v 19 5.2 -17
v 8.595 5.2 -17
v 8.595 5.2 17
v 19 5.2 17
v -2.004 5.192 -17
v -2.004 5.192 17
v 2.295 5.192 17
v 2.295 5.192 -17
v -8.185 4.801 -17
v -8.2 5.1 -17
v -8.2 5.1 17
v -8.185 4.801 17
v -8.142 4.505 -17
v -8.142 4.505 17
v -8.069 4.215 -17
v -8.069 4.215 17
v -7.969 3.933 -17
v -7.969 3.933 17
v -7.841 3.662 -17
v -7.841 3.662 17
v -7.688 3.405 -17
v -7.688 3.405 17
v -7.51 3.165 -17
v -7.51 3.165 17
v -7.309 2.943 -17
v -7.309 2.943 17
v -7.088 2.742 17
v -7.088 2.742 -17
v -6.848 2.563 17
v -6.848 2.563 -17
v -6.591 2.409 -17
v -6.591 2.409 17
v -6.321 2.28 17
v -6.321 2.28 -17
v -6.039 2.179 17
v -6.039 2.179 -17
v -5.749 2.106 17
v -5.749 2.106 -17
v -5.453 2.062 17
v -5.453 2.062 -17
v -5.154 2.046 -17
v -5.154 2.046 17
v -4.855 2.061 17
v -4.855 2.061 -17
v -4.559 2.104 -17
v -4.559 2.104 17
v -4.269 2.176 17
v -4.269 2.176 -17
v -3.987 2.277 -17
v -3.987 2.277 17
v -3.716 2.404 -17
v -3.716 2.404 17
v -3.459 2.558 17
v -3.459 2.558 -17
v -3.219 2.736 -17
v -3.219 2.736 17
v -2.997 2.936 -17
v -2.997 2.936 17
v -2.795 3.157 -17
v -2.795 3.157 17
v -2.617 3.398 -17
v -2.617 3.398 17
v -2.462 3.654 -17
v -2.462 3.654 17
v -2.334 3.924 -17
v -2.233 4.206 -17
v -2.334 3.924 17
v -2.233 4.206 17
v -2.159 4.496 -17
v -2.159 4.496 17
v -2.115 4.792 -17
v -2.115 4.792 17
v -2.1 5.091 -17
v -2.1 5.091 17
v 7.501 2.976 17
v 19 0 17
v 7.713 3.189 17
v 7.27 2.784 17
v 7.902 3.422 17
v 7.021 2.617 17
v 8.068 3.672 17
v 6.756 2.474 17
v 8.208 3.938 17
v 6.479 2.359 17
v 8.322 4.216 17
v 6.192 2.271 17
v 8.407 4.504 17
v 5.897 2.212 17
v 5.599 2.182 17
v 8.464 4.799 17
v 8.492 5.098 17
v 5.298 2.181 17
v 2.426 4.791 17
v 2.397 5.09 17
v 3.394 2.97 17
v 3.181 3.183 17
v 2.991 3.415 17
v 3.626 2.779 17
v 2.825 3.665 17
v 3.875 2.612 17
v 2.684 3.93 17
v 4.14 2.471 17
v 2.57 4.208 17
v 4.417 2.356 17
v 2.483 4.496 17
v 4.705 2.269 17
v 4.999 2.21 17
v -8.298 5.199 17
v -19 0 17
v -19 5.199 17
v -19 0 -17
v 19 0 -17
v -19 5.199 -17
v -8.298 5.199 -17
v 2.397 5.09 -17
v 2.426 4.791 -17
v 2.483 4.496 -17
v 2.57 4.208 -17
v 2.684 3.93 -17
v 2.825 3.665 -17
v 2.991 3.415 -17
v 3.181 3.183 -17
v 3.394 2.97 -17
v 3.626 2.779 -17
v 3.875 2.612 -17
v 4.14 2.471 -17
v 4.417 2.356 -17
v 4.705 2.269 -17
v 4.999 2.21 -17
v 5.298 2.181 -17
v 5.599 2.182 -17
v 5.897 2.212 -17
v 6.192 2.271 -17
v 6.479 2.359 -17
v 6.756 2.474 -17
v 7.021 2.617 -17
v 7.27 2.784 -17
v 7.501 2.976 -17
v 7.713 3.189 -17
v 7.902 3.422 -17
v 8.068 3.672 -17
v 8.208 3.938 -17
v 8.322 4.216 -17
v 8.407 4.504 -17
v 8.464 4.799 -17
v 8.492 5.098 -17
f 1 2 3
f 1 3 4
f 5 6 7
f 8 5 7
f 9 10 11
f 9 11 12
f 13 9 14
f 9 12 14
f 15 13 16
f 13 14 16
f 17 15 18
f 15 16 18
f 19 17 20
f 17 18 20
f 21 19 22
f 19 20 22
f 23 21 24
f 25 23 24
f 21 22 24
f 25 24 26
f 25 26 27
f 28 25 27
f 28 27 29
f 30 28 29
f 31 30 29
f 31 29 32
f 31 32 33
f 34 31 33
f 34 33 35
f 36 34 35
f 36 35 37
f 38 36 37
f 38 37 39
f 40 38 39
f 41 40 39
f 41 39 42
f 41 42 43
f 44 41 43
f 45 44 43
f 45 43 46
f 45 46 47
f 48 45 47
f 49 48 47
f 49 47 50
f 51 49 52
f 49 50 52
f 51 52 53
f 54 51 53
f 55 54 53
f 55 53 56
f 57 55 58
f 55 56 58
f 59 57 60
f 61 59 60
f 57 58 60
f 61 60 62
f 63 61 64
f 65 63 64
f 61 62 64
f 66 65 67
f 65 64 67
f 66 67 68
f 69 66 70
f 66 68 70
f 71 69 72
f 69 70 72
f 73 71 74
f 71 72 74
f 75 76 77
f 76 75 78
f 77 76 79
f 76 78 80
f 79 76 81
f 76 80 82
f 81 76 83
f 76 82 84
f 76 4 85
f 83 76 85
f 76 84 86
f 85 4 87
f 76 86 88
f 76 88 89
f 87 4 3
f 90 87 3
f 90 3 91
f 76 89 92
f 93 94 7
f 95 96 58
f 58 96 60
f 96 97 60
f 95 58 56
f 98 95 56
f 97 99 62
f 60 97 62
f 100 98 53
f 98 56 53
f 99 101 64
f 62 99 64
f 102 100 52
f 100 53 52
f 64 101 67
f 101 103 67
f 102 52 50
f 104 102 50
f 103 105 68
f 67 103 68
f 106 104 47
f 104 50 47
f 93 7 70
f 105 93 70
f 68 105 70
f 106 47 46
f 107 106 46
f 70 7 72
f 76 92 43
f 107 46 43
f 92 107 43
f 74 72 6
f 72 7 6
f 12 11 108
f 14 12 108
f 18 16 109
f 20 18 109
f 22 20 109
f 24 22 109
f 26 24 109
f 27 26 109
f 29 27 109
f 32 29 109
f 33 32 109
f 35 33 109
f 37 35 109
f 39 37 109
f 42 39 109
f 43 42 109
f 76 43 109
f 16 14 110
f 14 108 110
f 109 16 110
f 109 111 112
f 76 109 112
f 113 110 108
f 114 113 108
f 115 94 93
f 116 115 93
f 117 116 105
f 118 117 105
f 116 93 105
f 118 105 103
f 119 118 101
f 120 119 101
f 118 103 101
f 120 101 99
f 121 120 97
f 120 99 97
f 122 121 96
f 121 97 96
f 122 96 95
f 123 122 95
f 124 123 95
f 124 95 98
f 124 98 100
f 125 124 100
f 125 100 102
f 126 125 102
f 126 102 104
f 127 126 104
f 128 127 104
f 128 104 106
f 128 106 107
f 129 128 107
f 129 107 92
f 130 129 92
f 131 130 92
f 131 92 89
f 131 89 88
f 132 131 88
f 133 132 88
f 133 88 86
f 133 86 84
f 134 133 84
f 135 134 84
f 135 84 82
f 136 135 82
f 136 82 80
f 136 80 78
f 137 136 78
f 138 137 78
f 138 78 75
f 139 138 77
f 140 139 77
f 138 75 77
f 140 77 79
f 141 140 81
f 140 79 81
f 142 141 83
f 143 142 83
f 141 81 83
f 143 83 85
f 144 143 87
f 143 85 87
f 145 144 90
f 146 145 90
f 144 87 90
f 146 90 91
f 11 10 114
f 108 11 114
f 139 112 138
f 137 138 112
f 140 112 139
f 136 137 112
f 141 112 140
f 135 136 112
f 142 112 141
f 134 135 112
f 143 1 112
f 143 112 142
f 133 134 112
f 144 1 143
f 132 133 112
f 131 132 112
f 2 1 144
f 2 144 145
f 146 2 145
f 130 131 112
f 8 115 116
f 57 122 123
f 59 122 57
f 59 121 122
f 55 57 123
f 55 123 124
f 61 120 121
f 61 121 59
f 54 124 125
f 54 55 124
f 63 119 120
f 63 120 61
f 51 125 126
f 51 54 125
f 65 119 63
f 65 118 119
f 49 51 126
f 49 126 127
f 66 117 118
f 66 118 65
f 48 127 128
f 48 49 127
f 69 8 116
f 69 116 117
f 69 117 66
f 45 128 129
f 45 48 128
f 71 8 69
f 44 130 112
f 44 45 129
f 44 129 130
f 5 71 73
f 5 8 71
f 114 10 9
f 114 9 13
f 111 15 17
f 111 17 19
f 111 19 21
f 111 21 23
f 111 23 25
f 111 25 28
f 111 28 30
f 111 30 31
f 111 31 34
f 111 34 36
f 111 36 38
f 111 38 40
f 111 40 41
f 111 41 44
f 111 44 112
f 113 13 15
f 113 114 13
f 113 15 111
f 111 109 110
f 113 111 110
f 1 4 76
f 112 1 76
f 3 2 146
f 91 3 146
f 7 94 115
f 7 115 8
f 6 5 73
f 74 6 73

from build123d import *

# Parameters (mm, degrees)
SKETCH1_W           = 38
SKETCH1_H           = 34
BOSS_EXTRUDE1_DEPTH = 2
BOSS_EXTRUDE2_DEPTH = 34
CHAMFER1_SIZE       = 0.1
CHAMFER1_SIZE_2     = 0.100939666
CHAMFER1_SIZE_3     = 0.096996068


with BuildPart() as part:
    # Sketch1 → Boss-Extrude1 (new body)
    with BuildSketch(Plane(origin=(0, 0, 0), x_dir=(1, 0, 0), z_dir=(0, 1, 0))):
        Rectangle(SKETCH1_W, SKETCH1_H)
    extrude(amount=BOSS_EXTRUDE1_DEPTH)

    # Sketch2 → Boss-Extrude2 (add, through all)
    with BuildSketch(Plane.XY.offset(17)):
        with BuildLine():
            Line((-2.101169585, 5.192456713), (2.394541693, 5.192456713))
            ThreePointArc((2.394541693, 5.192456713), (5.447861319, 2.177768465), (8.494206352, 5.199504374))
            Line((8.494206352, 5.199504374), (19, 5.199504374))
            Line((19, 5.199504374), (19, 1.662378765))
            Line((19, 1.662378765), (-19, 1.662378765))
            Line((-19, 1.662378765), (-19, 5.198537403))
            Line((-19, 5.198537403), (-8.197951747, 5.198537403))
            ThreePointArc((-8.197951747, 5.198537403), (-5.152701361, 2.046490686), (-2.101169585, 5.192456713))
        make_face()
    extrude(amount=-BOSS_EXTRUDE2_DEPTH)

    # Chamfer1
    # the kernel refuses this chamfer: 0.101178115, 0.100939666, 0.1, 0.096996068, 0.096814929 mm, written as the material it takes off along each edge
    with BuildSketch(Plane(origin=(2.394541693, 5.192456713, 17.264875528), x_dir=(0.028454787424249305, -0.9995950805564424, 0), z_dir=(0, 0, -1))) as chamfer1_piece_1:
        with BuildLine():
            Line((0.102971734, 0), (-CHAMFER1_SIZE * 0.0284547874242, CHAMFER1_SIZE * 0.999595080556))
            Line((-CHAMFER1_SIZE * 0.0284547874242, CHAMFER1_SIZE * 0.999595080556), (0, 0))
            ThreePointArc((0, 0), (0.052957758, 0.000434232), (0.102971734, 0))
        make_face()
    extrude(amount=34.529751055, mode=Mode.SUBTRACT)
    with BuildSketch(Plane(origin=(8.494206352, 5.199504374, 17.261624735), x_dir=(1, 0, 0), z_dir=(0, 0, -1))) as chamfer1_piece_2:
        with BuildLine():
            Line((CHAMFER1_SIZE_2 * 0.999999995384, 0), (-0.002638157, 0.10167581))
            ThreePointArc((-0.002638157, 0.10167581), (-0.000933226, 0.052300381), (0, 0))
            Line((0, 0), (CHAMFER1_SIZE_2 * 0.999999995384, 0))
        make_face()
    extrude(amount=34.52324947, mode=Mode.SUBTRACT)
    with BuildSketch(Plane(origin=(-8.197951747, 5.198537403, 17.257168299), x_dir=(-0.017346814306717553, -0.9998495326964995, 0), z_dir=(0, 0, -1))) as chamfer1_piece_3:
        with BuildLine():
            Line((0.098309437, 0), (CHAMFER1_SIZE * 0.0173468143067, CHAMFER1_SIZE * 0.999849532696))
            Line((CHAMFER1_SIZE * 0.0173468143067, CHAMFER1_SIZE * 0.999849532696), (0, 0))
            ThreePointArc((0, 0), (0.050545023, 0.000395805), (0.098309437, 0))
        make_face()
    extrude(amount=34.514336598, mode=Mode.SUBTRACT)
    with BuildSketch(Plane(origin=(-2.101169585, 5.192456713, 17.261555472), x_dir=(1, 0, 0), z_dir=(0, 0, -1))) as chamfer1_piece_4:
        with BuildLine():
            Line((CHAMFER1_SIZE_3 * 0.999999996404, 0), (0.001504787, 0.101698897))
            ThreePointArc((0.001504787, 0.101698897), (0.001197292, 0.052281476), (0, 0))
            Line((0, 0), (CHAMFER1_SIZE_3 * 0.999999996404, 0))
        make_face()
    extrude(amount=34.523110943, mode=Mode.SUBTRACT)


solid = part.part
